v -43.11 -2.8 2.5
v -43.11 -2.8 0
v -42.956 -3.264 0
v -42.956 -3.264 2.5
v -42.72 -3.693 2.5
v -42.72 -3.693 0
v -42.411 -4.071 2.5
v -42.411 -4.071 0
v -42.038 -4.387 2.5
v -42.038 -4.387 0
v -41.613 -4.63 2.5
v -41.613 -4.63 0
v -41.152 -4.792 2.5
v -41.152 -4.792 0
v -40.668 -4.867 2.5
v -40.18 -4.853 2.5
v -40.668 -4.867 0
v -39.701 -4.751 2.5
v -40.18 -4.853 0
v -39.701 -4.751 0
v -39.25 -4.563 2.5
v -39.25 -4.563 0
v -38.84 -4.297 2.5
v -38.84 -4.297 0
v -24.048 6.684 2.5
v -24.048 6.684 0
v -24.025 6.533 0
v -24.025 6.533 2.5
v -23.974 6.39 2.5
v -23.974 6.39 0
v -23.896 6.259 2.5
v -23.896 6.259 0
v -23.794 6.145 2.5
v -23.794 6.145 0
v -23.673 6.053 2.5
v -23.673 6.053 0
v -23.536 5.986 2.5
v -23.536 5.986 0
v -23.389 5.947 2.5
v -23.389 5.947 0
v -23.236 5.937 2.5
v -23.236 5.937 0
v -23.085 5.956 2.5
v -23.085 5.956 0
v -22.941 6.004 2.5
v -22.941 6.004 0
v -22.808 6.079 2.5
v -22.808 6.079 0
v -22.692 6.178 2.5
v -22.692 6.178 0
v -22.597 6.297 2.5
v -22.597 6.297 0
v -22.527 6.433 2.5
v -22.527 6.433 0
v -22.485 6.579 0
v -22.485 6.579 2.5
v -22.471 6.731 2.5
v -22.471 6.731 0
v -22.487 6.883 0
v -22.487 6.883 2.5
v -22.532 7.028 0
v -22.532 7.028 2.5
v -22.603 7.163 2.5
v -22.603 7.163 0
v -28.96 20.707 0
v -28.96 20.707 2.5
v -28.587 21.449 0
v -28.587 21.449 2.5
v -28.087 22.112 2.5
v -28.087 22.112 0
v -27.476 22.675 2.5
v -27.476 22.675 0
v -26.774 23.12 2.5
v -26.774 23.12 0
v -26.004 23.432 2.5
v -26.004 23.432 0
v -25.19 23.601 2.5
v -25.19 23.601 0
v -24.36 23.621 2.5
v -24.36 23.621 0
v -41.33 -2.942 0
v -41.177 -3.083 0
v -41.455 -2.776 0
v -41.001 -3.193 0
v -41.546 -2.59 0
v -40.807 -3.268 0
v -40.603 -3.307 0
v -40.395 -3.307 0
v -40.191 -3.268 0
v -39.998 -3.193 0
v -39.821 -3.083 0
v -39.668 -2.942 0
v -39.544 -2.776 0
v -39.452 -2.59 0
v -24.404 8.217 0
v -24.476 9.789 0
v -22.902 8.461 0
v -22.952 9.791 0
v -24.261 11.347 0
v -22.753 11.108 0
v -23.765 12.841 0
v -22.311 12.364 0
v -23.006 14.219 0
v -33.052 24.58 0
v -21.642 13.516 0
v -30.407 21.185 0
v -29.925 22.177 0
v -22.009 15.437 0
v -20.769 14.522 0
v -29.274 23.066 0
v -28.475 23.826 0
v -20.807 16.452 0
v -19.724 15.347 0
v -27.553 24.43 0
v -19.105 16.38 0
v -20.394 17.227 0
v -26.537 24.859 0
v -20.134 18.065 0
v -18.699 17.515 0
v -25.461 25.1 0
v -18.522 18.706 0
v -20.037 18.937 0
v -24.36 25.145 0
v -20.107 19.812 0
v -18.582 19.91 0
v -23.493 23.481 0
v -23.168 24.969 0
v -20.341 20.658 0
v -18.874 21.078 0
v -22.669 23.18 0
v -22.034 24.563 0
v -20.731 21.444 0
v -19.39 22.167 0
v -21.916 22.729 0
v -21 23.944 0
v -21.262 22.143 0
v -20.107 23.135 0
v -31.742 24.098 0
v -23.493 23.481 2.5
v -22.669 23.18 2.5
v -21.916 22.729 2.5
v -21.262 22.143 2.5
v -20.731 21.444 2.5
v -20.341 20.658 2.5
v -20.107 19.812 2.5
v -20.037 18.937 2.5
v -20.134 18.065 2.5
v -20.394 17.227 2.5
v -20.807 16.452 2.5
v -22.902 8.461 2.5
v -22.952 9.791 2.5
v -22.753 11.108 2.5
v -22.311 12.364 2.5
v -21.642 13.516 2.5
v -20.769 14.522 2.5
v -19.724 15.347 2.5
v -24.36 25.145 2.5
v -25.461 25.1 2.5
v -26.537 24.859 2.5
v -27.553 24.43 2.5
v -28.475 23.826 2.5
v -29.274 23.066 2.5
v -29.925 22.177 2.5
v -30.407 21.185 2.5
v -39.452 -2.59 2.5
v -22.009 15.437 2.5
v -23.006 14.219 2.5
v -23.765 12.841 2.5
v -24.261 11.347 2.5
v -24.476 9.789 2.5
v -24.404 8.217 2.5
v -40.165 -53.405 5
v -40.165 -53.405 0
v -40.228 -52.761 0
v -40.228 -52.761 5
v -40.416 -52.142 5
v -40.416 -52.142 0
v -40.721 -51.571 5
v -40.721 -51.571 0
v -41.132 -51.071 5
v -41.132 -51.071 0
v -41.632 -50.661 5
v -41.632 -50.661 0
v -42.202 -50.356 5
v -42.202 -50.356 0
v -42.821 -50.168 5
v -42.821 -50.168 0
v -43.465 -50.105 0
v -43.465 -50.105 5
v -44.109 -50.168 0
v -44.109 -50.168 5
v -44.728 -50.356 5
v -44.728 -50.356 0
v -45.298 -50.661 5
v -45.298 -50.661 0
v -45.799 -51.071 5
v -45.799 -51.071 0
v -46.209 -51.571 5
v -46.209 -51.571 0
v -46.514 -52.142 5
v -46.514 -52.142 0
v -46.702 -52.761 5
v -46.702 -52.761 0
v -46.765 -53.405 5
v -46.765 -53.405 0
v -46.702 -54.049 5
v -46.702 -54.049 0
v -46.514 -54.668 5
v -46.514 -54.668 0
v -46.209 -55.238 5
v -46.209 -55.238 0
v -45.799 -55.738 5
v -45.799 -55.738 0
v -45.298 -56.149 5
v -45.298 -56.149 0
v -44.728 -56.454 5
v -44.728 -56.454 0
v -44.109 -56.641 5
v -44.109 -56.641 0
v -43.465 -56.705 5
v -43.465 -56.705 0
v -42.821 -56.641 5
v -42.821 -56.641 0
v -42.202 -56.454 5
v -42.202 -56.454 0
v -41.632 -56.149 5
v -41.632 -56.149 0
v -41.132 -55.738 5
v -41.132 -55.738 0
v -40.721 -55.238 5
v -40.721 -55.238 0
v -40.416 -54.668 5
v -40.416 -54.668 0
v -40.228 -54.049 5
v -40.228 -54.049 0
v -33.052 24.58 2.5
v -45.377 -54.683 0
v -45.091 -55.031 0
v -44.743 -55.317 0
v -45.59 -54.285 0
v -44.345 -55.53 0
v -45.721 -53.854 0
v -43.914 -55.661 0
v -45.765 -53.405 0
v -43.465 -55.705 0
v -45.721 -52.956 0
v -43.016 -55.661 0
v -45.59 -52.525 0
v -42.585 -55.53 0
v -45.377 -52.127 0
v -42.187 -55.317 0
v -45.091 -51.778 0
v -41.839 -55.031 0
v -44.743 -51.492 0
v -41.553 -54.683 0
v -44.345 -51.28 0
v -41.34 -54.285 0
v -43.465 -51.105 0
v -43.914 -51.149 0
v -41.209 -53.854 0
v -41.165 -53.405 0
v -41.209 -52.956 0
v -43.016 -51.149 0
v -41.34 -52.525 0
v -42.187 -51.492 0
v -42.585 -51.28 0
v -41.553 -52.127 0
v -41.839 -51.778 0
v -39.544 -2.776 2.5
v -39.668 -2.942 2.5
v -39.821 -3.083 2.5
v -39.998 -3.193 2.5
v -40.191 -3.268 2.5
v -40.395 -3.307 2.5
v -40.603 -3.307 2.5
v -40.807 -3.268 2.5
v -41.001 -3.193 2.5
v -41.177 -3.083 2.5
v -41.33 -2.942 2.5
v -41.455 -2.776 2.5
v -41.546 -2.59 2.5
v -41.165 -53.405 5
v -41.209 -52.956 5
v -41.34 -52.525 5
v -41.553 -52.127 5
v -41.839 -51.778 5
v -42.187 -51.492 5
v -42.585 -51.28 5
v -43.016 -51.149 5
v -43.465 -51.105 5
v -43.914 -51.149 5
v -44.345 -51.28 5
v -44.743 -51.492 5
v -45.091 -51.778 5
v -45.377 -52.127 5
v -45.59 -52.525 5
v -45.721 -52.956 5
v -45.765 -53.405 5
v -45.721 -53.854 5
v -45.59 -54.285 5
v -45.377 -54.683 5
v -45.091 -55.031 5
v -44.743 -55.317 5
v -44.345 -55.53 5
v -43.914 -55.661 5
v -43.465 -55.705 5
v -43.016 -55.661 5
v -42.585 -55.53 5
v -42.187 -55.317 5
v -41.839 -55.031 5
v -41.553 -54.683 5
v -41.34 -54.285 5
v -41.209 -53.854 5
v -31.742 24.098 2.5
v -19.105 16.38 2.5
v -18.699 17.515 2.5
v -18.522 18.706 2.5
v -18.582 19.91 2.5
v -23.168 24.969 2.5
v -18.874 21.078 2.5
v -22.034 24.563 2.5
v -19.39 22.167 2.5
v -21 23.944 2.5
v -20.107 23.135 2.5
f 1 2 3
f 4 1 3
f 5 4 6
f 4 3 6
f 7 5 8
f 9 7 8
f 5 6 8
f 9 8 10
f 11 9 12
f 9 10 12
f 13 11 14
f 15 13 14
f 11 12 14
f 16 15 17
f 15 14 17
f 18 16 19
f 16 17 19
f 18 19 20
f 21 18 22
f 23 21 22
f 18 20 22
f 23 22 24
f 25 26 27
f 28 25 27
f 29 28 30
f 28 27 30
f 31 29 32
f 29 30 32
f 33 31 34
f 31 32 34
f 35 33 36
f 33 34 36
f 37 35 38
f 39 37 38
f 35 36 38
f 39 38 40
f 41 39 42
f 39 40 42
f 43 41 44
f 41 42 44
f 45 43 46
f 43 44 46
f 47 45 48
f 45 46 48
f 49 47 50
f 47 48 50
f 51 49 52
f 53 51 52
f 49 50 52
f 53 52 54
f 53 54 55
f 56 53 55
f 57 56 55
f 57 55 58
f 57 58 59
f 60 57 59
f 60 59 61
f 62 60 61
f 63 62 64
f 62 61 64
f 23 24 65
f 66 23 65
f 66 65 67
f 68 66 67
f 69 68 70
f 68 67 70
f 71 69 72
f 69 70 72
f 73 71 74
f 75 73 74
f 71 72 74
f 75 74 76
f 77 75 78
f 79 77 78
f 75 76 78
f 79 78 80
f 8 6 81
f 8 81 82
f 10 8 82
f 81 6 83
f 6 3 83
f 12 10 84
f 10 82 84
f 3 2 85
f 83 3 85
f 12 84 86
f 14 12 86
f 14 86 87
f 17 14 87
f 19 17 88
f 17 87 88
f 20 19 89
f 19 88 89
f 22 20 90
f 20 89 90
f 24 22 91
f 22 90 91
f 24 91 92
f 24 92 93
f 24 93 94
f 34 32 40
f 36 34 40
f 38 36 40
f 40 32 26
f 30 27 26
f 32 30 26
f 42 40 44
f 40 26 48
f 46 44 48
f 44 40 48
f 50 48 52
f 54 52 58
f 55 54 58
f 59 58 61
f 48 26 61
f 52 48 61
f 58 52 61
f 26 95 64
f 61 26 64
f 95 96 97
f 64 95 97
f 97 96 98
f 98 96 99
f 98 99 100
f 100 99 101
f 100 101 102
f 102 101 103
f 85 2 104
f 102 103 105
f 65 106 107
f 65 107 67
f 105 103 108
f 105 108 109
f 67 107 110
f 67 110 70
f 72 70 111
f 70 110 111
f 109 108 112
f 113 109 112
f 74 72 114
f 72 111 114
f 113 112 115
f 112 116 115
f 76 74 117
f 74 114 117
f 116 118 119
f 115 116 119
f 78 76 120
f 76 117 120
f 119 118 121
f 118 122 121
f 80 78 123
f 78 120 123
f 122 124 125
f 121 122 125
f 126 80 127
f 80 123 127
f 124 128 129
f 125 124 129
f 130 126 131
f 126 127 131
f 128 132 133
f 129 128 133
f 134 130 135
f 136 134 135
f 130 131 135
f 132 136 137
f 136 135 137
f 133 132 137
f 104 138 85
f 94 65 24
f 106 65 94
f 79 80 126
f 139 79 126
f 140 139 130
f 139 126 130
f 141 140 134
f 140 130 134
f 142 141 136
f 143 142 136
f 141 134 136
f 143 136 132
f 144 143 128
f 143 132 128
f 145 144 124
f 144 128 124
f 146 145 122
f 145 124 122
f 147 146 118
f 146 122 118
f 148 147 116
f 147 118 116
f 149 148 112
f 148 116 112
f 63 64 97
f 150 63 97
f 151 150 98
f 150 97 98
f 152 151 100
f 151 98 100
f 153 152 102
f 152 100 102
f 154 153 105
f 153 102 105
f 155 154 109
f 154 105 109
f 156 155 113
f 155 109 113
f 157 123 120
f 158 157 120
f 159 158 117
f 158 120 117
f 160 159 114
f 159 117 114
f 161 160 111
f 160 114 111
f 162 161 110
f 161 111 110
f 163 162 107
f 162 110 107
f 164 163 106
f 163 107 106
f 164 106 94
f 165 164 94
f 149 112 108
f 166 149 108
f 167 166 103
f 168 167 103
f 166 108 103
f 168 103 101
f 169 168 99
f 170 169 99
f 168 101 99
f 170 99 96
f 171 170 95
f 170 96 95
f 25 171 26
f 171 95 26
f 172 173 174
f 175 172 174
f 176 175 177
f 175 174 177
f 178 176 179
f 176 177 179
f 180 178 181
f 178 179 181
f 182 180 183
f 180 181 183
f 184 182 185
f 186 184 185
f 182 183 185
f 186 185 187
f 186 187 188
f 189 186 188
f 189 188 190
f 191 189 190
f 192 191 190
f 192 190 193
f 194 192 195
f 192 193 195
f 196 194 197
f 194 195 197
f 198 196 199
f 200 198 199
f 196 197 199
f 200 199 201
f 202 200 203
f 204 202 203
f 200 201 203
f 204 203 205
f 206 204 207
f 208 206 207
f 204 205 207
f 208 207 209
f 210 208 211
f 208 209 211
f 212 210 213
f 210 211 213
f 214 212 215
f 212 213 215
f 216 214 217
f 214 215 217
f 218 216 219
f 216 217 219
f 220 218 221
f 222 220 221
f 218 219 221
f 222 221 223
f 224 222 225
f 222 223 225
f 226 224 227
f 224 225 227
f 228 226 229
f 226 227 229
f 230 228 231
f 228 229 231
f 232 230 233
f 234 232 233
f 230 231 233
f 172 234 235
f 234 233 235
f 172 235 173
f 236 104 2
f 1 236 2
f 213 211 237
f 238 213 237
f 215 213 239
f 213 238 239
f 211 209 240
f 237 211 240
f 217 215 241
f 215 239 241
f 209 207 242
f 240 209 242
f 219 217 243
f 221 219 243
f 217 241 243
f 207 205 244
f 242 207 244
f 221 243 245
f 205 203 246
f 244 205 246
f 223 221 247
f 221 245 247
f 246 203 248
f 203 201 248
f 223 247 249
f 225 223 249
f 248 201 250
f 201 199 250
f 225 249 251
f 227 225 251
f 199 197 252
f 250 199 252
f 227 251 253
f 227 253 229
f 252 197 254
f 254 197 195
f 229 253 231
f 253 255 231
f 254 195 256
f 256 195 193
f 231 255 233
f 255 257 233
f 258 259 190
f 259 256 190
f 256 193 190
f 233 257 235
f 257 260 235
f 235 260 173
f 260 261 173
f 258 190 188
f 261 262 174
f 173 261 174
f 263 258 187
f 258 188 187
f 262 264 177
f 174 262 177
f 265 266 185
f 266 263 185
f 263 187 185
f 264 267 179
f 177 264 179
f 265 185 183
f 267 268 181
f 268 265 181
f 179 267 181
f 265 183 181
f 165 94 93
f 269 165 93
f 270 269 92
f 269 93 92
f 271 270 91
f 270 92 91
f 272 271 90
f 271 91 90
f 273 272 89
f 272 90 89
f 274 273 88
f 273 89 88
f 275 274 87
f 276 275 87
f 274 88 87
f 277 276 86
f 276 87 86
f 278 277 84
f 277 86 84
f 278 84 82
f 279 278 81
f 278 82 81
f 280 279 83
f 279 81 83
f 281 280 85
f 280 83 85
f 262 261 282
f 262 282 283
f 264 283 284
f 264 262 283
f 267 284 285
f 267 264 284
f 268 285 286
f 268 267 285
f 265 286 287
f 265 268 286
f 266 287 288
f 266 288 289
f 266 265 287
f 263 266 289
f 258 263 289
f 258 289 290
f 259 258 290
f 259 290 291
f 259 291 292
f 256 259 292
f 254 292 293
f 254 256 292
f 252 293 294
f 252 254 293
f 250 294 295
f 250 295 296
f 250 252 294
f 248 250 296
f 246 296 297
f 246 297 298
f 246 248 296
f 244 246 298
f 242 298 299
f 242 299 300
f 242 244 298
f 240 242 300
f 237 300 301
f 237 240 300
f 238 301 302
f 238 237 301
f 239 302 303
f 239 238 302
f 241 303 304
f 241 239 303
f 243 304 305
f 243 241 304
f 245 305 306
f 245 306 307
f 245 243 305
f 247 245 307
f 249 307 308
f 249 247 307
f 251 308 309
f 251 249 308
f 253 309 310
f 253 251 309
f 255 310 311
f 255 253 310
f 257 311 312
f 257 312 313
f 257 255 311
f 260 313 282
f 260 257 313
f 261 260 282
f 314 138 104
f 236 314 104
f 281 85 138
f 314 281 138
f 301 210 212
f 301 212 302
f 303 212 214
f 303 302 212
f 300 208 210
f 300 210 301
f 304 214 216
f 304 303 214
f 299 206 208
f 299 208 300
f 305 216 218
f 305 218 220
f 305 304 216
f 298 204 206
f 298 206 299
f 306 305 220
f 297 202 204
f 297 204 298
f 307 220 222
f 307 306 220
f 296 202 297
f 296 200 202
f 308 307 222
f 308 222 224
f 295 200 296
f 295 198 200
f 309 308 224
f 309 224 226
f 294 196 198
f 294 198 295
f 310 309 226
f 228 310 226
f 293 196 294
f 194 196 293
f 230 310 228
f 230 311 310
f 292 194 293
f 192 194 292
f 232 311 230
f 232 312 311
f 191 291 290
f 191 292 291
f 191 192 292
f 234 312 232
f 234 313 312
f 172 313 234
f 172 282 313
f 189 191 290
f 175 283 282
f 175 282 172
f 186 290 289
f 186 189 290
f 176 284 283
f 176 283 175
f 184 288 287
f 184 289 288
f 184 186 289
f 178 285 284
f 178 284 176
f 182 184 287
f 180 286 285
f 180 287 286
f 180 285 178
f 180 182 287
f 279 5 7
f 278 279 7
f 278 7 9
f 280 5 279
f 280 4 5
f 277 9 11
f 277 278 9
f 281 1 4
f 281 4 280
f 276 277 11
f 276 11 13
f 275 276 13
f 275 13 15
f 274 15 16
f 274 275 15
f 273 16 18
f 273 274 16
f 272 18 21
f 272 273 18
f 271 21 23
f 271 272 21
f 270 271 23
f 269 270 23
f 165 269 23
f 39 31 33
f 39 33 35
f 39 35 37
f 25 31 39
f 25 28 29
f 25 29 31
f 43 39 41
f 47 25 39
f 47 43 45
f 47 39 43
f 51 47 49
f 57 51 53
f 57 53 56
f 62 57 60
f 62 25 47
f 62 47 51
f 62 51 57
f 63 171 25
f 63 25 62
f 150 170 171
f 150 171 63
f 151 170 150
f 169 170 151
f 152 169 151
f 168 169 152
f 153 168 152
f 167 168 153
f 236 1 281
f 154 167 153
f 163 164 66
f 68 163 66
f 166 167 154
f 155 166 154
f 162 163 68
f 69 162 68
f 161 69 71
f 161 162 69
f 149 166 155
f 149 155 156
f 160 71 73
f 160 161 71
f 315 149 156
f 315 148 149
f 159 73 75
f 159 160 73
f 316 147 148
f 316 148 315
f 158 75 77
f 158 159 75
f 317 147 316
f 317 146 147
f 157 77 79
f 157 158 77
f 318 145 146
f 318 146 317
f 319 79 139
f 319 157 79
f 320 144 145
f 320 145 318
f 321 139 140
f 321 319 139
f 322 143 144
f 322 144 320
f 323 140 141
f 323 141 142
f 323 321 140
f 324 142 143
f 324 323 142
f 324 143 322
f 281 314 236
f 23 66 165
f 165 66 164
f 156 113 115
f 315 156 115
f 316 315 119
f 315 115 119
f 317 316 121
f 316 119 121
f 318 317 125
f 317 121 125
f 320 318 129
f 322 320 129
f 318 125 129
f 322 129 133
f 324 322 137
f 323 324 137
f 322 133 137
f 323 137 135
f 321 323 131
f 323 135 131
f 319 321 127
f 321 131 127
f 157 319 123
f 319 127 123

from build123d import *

# Parameters (mm, degrees)
F1_DEPTH = 2.5
F2_R     = 3.3
F2_R_2   = 2.3
F3_DEPTH = 5


with BuildPart() as f1:
    # F0 (on Top) → F1 (new body)
    with BuildSketch(Plane.XY):
        with BuildLine():
            Line((-30.406968, 21.184699), (-39.452191, -2.589572))
            ThreePointArc((-39.452191, -2.589572), (-40.499172, -3.311432), (-41.546153, -2.589572))
            Line((-41.546153, -2.589572), (-31.741726, 24.098489))
            Line((-31.741726, 24.098489), (-33.051661, 24.579721))
            Line((-33.051661, 24.579721), (-43.110168, -2.799958))
            ThreePointArc((-43.110168, -2.799958), (-41.386106, -4.721293), (-38.839758, -4.296986))
            Line((-38.839758, -4.296986), (-28.960331, 20.706533))
            ThreePointArc((-28.960331, 20.706533), (-27.134708, 22.913173), (-24.359677, 23.621242))
            Line((-24.359677, 23.621242), (-24.359677, 25.145418))
            ThreePointArc((-24.359677, 25.145418), (-28.027297, 24.14829), (-30.406968, 21.184699))
        make_face()
        with BuildLine():
            ThreePointArc((-19.72417, 15.347021), (-19.105297, 21.635503), (-24.359677, 25.145418))
            Line((-24.359677, 25.145418), (-24.359677, 23.621242))
            ThreePointArc((-24.359677, 23.621242), (-20.51759, 21.060543), (-20.806932, 16.452387))
            ThreePointArc((-20.806932, 16.452387), (-24.047, 12.105547), (-24.047842, 6.684011))
            ThreePointArc((-24.047842, 6.684011), (-23.011778, 5.976509), (-22.603361, 7.162757))
            ThreePointArc((-22.603361, 7.162757), (-22.561564, 11.746629), (-19.72417, 15.347021))
        make_face()
    extrude(amount=F1_DEPTH)


with BuildPart() as f3:
    # F2 (on Top) → F3 (new body)
    with BuildSketch(Plane.XY):
        with Locations((-43.465074, -53.404797)):
            Circle(F2_R)
        with Locations((-43.465074, -53.404797)):
            Circle(F2_R_2, mode=Mode.SUBTRACT)
    extrude(amount=F3_DEPTH)


solid = Compound([f1.part, f3.part])
